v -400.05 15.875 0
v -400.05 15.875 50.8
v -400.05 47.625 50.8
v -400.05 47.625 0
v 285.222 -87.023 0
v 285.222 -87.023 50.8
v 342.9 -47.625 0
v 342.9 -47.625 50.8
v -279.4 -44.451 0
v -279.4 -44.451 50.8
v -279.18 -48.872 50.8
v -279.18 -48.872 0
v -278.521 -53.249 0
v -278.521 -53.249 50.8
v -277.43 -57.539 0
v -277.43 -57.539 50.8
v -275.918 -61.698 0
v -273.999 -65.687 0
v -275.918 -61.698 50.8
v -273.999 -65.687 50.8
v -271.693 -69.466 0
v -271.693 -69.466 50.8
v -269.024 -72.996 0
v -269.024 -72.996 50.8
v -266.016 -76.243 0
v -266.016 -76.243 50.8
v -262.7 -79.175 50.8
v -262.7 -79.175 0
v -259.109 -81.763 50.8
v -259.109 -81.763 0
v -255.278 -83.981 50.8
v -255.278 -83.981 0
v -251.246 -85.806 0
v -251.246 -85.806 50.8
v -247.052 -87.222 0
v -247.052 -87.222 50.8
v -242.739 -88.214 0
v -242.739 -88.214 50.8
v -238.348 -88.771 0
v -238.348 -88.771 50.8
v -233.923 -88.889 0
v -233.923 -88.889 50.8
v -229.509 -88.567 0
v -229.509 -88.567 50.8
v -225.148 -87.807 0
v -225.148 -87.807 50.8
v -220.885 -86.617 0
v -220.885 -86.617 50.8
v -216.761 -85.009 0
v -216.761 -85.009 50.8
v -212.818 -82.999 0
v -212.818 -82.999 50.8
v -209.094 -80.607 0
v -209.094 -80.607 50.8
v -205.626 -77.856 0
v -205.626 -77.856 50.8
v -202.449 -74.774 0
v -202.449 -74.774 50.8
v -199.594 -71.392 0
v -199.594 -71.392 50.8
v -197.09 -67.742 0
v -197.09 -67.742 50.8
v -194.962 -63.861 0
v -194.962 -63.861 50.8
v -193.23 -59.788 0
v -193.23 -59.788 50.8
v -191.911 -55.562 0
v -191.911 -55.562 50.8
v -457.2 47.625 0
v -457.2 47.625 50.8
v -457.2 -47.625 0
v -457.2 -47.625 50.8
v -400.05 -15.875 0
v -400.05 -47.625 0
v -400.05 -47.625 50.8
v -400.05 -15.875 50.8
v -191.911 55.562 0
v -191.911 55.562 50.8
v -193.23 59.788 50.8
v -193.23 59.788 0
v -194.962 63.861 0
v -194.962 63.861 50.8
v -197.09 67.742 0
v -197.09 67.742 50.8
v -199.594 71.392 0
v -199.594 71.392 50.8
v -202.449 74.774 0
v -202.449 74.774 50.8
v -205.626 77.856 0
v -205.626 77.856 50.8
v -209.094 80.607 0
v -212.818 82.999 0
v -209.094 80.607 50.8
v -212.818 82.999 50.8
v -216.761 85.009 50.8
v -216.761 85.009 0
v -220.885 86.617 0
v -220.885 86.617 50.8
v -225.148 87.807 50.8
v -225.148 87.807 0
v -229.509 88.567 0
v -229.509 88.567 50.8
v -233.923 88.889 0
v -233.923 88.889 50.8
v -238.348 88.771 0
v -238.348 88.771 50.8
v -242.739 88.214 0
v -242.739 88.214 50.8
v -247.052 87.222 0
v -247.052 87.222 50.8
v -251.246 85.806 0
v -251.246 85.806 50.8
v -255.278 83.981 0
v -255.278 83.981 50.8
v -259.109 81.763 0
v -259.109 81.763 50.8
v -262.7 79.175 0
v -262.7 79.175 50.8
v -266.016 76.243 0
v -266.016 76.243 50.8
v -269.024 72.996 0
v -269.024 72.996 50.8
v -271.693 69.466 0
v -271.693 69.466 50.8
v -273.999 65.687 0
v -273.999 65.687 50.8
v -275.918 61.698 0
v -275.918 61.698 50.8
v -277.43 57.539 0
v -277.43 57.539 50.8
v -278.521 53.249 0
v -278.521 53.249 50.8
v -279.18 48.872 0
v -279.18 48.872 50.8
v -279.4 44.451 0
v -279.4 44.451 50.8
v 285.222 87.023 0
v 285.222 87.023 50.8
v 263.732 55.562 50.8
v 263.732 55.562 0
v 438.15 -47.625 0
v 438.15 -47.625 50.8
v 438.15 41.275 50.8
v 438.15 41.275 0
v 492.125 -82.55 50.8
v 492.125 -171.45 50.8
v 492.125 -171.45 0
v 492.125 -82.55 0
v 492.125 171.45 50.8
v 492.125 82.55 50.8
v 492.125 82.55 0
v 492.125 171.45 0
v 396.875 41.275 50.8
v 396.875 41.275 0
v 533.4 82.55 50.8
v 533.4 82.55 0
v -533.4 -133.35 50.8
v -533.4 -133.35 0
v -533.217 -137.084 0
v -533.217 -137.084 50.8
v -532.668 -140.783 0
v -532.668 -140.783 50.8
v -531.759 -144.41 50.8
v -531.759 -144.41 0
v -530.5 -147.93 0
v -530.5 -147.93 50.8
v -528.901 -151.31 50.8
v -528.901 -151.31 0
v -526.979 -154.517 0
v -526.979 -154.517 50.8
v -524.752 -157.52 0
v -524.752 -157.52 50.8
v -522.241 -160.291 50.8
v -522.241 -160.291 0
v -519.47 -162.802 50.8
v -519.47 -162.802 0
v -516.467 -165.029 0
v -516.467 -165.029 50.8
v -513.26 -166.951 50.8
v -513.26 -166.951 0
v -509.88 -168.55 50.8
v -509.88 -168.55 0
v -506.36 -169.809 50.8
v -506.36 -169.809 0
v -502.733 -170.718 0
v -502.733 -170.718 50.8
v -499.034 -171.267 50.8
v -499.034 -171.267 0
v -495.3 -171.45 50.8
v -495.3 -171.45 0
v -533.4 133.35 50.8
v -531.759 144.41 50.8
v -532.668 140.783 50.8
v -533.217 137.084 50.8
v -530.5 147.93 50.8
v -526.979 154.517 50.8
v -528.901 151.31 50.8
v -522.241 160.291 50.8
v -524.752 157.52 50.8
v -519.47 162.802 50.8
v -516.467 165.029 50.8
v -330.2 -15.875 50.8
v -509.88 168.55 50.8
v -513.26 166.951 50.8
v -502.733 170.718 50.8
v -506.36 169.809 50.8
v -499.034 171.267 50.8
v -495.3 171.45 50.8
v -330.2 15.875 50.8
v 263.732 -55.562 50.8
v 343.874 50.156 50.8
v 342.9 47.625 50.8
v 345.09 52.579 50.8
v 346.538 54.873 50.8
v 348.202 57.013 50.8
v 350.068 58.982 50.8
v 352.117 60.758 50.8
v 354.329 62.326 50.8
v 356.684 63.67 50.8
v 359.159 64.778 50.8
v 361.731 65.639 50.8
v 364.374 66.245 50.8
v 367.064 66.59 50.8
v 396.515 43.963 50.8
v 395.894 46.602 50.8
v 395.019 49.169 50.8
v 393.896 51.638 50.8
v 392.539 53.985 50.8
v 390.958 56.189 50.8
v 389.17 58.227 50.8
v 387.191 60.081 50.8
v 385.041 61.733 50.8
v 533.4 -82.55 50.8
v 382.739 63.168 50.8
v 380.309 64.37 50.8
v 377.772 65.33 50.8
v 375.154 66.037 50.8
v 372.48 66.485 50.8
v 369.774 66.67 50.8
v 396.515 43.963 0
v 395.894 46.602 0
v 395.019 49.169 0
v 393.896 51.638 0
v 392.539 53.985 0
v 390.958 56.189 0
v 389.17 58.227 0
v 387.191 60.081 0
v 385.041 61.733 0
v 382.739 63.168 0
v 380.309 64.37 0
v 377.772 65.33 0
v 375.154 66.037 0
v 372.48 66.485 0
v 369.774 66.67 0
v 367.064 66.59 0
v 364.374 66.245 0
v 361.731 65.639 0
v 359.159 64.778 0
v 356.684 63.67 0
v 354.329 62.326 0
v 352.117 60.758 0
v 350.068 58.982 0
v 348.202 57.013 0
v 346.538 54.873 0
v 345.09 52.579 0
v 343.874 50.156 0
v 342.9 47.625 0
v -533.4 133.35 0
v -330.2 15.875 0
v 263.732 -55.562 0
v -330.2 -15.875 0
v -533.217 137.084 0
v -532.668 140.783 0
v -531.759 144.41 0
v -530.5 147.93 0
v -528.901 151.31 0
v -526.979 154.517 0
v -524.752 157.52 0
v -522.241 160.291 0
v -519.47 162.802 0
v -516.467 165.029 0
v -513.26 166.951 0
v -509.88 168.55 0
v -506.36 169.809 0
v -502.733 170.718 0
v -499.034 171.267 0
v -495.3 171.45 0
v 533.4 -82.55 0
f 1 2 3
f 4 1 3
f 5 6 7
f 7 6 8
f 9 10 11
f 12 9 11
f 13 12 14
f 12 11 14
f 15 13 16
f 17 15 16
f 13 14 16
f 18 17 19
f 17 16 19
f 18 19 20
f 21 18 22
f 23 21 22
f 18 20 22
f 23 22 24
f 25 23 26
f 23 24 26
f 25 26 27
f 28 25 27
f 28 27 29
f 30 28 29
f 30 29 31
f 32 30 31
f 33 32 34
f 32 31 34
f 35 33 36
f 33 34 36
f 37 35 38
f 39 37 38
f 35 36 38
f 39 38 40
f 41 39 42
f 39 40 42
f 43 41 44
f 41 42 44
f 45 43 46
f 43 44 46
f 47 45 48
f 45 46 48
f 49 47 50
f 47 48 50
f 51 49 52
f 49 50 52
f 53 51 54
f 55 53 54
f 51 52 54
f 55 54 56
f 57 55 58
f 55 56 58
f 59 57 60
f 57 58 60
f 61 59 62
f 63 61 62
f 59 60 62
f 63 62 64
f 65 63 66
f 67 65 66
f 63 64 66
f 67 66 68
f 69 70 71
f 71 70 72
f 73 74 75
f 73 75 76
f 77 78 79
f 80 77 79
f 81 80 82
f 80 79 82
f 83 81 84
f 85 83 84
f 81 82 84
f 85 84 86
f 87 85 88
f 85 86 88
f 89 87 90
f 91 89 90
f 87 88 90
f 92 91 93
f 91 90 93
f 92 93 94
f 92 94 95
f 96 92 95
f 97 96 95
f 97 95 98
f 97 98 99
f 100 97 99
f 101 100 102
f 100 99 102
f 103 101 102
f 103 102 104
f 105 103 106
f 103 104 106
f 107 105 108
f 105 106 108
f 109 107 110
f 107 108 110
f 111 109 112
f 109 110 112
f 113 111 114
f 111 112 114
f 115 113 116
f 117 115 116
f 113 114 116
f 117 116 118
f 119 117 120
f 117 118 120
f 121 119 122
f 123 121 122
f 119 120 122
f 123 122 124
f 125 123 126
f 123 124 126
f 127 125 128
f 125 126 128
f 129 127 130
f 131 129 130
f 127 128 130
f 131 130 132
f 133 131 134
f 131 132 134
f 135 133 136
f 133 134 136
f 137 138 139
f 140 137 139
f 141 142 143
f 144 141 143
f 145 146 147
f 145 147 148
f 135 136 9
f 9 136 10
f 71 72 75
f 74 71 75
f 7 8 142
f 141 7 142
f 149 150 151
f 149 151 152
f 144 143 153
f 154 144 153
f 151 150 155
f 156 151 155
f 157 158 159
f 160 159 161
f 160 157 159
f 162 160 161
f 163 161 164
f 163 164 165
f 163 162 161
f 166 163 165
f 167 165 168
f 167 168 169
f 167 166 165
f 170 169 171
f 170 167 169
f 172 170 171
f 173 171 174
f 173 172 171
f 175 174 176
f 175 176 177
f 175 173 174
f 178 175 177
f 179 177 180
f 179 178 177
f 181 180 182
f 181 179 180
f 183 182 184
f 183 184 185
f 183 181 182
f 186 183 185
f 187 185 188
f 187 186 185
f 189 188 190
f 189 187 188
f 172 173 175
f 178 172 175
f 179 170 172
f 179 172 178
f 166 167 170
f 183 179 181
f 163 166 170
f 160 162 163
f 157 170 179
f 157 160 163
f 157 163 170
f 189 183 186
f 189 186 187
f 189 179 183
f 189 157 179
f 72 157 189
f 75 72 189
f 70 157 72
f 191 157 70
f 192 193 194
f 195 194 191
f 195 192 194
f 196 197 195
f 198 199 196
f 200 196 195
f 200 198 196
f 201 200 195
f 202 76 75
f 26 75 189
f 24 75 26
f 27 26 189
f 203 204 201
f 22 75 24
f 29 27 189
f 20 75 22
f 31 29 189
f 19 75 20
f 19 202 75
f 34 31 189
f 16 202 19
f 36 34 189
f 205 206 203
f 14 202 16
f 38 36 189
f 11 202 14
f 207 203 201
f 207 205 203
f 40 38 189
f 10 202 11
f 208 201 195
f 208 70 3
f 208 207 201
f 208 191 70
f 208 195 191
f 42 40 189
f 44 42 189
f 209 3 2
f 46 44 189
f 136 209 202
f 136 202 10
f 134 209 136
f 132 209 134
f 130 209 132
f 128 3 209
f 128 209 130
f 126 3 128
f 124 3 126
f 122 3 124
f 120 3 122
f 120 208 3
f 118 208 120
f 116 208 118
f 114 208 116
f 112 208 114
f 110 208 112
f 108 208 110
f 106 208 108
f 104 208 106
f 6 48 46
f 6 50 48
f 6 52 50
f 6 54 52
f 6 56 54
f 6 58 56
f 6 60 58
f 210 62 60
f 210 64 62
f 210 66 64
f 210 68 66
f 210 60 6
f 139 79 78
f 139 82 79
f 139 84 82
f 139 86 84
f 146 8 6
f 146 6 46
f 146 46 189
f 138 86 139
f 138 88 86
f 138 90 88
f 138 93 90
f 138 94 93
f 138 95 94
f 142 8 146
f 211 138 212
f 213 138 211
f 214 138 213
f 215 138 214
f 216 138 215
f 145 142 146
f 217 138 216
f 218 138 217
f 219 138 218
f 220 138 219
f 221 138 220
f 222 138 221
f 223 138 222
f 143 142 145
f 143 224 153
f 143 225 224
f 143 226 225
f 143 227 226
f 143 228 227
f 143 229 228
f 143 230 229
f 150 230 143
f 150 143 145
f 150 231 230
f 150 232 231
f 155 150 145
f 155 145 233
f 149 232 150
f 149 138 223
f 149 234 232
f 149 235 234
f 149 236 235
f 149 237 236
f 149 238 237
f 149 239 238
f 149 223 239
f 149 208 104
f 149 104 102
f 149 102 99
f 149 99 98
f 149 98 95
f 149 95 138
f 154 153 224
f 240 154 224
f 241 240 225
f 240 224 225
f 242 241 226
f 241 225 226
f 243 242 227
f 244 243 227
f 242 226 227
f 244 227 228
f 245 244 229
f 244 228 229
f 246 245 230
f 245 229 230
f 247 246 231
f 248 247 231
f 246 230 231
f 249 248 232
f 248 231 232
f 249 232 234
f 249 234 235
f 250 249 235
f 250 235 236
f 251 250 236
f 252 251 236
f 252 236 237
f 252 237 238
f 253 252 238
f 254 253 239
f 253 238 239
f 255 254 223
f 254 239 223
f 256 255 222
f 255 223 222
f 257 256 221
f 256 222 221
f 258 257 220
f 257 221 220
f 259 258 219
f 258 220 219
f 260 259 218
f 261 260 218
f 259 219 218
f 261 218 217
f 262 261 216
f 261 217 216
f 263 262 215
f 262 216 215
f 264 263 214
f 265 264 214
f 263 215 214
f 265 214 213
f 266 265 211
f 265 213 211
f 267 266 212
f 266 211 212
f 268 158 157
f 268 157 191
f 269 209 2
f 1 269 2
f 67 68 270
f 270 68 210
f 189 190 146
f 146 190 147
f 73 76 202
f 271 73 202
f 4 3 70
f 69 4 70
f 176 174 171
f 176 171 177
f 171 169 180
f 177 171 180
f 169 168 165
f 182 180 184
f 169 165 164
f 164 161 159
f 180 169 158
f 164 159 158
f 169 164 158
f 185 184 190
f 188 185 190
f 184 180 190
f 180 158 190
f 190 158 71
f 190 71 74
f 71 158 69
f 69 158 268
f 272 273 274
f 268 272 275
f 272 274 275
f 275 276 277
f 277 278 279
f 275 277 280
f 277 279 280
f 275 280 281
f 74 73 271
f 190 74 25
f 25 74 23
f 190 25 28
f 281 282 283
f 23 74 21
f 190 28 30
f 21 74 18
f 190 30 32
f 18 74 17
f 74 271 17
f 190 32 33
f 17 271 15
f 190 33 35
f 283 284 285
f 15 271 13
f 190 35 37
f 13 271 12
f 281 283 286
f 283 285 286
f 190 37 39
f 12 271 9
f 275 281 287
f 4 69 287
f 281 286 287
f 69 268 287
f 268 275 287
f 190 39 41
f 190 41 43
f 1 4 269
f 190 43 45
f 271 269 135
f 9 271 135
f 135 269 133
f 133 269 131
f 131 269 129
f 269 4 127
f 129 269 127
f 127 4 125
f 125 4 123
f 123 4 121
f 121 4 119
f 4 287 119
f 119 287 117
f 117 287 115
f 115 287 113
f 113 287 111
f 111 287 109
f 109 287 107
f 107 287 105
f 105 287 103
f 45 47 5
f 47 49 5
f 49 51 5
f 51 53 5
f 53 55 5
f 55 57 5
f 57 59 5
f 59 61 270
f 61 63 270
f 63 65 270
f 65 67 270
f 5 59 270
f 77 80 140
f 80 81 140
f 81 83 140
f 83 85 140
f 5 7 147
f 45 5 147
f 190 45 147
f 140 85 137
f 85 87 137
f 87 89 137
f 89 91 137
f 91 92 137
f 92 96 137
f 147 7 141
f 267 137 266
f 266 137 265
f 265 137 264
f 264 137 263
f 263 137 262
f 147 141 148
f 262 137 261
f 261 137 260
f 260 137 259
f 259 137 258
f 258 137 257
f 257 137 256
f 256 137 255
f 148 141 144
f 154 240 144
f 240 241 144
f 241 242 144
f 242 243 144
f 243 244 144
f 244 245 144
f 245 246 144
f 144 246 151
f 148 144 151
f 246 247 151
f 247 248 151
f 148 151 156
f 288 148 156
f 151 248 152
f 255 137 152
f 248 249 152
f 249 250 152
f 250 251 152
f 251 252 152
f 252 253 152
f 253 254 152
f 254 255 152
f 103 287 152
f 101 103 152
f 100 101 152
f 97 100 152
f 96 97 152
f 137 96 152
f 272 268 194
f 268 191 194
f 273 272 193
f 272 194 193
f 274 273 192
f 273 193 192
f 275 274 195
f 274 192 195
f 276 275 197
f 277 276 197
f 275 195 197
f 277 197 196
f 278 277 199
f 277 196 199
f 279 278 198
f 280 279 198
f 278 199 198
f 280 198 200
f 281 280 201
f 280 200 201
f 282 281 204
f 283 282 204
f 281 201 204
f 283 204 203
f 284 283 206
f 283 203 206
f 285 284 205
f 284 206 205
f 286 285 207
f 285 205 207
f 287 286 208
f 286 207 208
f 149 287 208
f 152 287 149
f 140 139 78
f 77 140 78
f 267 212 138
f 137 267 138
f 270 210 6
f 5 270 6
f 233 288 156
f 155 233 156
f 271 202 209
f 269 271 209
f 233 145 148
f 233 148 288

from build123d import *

# Parameters (mm, degrees)
F0_W     = 1066.8
F0_H     = 342.9
F1_DEPTH = 50.8
F2_R     = 38.1
F3_W     = 41.275
F3_H     = 88.9
F4_DEPTH = 50.8
F7_DEPTH = 50.8
F8_DEPTH = 50.8


with BuildPart() as f1:
    # F0 (on Top) → F1 (new body)
    with BuildSketch(Plane.XY):
        Rectangle(F0_W, F0_H)
    extrude(amount=F1_DEPTH)

    # F2
    f2_edges = [f1.edges().sort_by_distance(p)[0] for p in [
        (-533.4, 171.45, 25.4),
        (-533.4, -171.45, 25.4),
        (533.4, 171.45, 25.4),
        (533.4, -171.45, 25.4),
    ]]
    fillet(f2_edges, radius=F2_R)

    # F3 (on face) → F4 (cut)
    with BuildSketch(Plane.XY.offset(50.8)):
        with Locations((512.7625, 127)):
            Rectangle(F3_W, F3_H)
        with Locations((512.7625, -127)):
            Rectangle(F3_W, F3_H)
    extrude(amount=-F4_DEPTH, mode=Mode.SUBTRACT)

    # F6 (on face) → F7 (cut)
    with BuildSketch(Plane.XY.offset(50.8)):
        with BuildLine():
            ThreePointArc((-279.4, 44.45127), (-234.95, 0.00127), (-190.5, 44.45127))
            ThreePointArc((-190.5, 44.45127), (-190.854197, 50.05151), (-191.911145, 55.5625))
            ThreePointArc((-191.911145, 55.5625), (-240.55024, 88.547073), (-279.4, 44.45127))
        make_face()
        with BuildLine():
            ThreePointArc((-191.911145, 55.5625), (-190.854197, 50.05151), (-190.5, 44.45127))
            ThreePointArc((-190.5, 44.45127), (-234.95, 0.00127), (-279.4, 44.45127))
            Line((-279.4, 44.45127), (-279.4, -44.45127))
            ThreePointArc((-279.4, -44.45127), (-234.95, -0.00127), (-190.5, -44.45127))
            ThreePointArc((-190.5, -44.45127), (-190.854197, -50.05151), (-191.911145, -55.5625))
            Line((-191.911145, -55.5625), (263.731644, -55.5625))
            Line((263.731644, -55.5625), (285.221681, -87.023401))
            Line((285.221681, -87.023401), (342.9, -47.625))
            Line((342.9, -47.625), (438.15, -47.625))
            Line((438.15, -47.625), (438.15, 41.275))
            Line((438.15, 41.275), (396.875, 41.275))
            ThreePointArc((396.875, 41.275), (372.479858, 66.485039), (342.9, 47.625))
            Line((342.9, 47.625), (285.221681, 87.023401))
            Line((285.221681, 87.023401), (263.731644, 55.5625))
            Line((263.731644, 55.5625), (-191.911145, 55.5625))
        make_face()
        with BuildLine():
            ThreePointArc((-190.5, -44.45127), (-234.95, -0.00127), (-279.4, -44.45127))
            ThreePointArc((-279.4, -44.45127), (-240.55024, -88.547073), (-191.911145, -55.5625))
            ThreePointArc((-191.911145, -55.5625), (-190.854197, -50.05151), (-190.5, -44.45127))
        make_face()
    extrude(amount=-F7_DEPTH, mode=Mode.SUBTRACT)

    # F5 (on face) → F8 (cut)
    with BuildSketch(Plane.XY.offset(50.8)):
        Polygon((-400.05, 47.625), (-457.2, 47.625), (-457.2, -47.625), (-400.05, -47.625), (-400.05, -15.875), (-330.2, -15.875), (-330.2, 15.875), (-400.05, 15.875), align=None)
    extrude(amount=-F8_DEPTH, mode=Mode.SUBTRACT)


solid = f1.part
